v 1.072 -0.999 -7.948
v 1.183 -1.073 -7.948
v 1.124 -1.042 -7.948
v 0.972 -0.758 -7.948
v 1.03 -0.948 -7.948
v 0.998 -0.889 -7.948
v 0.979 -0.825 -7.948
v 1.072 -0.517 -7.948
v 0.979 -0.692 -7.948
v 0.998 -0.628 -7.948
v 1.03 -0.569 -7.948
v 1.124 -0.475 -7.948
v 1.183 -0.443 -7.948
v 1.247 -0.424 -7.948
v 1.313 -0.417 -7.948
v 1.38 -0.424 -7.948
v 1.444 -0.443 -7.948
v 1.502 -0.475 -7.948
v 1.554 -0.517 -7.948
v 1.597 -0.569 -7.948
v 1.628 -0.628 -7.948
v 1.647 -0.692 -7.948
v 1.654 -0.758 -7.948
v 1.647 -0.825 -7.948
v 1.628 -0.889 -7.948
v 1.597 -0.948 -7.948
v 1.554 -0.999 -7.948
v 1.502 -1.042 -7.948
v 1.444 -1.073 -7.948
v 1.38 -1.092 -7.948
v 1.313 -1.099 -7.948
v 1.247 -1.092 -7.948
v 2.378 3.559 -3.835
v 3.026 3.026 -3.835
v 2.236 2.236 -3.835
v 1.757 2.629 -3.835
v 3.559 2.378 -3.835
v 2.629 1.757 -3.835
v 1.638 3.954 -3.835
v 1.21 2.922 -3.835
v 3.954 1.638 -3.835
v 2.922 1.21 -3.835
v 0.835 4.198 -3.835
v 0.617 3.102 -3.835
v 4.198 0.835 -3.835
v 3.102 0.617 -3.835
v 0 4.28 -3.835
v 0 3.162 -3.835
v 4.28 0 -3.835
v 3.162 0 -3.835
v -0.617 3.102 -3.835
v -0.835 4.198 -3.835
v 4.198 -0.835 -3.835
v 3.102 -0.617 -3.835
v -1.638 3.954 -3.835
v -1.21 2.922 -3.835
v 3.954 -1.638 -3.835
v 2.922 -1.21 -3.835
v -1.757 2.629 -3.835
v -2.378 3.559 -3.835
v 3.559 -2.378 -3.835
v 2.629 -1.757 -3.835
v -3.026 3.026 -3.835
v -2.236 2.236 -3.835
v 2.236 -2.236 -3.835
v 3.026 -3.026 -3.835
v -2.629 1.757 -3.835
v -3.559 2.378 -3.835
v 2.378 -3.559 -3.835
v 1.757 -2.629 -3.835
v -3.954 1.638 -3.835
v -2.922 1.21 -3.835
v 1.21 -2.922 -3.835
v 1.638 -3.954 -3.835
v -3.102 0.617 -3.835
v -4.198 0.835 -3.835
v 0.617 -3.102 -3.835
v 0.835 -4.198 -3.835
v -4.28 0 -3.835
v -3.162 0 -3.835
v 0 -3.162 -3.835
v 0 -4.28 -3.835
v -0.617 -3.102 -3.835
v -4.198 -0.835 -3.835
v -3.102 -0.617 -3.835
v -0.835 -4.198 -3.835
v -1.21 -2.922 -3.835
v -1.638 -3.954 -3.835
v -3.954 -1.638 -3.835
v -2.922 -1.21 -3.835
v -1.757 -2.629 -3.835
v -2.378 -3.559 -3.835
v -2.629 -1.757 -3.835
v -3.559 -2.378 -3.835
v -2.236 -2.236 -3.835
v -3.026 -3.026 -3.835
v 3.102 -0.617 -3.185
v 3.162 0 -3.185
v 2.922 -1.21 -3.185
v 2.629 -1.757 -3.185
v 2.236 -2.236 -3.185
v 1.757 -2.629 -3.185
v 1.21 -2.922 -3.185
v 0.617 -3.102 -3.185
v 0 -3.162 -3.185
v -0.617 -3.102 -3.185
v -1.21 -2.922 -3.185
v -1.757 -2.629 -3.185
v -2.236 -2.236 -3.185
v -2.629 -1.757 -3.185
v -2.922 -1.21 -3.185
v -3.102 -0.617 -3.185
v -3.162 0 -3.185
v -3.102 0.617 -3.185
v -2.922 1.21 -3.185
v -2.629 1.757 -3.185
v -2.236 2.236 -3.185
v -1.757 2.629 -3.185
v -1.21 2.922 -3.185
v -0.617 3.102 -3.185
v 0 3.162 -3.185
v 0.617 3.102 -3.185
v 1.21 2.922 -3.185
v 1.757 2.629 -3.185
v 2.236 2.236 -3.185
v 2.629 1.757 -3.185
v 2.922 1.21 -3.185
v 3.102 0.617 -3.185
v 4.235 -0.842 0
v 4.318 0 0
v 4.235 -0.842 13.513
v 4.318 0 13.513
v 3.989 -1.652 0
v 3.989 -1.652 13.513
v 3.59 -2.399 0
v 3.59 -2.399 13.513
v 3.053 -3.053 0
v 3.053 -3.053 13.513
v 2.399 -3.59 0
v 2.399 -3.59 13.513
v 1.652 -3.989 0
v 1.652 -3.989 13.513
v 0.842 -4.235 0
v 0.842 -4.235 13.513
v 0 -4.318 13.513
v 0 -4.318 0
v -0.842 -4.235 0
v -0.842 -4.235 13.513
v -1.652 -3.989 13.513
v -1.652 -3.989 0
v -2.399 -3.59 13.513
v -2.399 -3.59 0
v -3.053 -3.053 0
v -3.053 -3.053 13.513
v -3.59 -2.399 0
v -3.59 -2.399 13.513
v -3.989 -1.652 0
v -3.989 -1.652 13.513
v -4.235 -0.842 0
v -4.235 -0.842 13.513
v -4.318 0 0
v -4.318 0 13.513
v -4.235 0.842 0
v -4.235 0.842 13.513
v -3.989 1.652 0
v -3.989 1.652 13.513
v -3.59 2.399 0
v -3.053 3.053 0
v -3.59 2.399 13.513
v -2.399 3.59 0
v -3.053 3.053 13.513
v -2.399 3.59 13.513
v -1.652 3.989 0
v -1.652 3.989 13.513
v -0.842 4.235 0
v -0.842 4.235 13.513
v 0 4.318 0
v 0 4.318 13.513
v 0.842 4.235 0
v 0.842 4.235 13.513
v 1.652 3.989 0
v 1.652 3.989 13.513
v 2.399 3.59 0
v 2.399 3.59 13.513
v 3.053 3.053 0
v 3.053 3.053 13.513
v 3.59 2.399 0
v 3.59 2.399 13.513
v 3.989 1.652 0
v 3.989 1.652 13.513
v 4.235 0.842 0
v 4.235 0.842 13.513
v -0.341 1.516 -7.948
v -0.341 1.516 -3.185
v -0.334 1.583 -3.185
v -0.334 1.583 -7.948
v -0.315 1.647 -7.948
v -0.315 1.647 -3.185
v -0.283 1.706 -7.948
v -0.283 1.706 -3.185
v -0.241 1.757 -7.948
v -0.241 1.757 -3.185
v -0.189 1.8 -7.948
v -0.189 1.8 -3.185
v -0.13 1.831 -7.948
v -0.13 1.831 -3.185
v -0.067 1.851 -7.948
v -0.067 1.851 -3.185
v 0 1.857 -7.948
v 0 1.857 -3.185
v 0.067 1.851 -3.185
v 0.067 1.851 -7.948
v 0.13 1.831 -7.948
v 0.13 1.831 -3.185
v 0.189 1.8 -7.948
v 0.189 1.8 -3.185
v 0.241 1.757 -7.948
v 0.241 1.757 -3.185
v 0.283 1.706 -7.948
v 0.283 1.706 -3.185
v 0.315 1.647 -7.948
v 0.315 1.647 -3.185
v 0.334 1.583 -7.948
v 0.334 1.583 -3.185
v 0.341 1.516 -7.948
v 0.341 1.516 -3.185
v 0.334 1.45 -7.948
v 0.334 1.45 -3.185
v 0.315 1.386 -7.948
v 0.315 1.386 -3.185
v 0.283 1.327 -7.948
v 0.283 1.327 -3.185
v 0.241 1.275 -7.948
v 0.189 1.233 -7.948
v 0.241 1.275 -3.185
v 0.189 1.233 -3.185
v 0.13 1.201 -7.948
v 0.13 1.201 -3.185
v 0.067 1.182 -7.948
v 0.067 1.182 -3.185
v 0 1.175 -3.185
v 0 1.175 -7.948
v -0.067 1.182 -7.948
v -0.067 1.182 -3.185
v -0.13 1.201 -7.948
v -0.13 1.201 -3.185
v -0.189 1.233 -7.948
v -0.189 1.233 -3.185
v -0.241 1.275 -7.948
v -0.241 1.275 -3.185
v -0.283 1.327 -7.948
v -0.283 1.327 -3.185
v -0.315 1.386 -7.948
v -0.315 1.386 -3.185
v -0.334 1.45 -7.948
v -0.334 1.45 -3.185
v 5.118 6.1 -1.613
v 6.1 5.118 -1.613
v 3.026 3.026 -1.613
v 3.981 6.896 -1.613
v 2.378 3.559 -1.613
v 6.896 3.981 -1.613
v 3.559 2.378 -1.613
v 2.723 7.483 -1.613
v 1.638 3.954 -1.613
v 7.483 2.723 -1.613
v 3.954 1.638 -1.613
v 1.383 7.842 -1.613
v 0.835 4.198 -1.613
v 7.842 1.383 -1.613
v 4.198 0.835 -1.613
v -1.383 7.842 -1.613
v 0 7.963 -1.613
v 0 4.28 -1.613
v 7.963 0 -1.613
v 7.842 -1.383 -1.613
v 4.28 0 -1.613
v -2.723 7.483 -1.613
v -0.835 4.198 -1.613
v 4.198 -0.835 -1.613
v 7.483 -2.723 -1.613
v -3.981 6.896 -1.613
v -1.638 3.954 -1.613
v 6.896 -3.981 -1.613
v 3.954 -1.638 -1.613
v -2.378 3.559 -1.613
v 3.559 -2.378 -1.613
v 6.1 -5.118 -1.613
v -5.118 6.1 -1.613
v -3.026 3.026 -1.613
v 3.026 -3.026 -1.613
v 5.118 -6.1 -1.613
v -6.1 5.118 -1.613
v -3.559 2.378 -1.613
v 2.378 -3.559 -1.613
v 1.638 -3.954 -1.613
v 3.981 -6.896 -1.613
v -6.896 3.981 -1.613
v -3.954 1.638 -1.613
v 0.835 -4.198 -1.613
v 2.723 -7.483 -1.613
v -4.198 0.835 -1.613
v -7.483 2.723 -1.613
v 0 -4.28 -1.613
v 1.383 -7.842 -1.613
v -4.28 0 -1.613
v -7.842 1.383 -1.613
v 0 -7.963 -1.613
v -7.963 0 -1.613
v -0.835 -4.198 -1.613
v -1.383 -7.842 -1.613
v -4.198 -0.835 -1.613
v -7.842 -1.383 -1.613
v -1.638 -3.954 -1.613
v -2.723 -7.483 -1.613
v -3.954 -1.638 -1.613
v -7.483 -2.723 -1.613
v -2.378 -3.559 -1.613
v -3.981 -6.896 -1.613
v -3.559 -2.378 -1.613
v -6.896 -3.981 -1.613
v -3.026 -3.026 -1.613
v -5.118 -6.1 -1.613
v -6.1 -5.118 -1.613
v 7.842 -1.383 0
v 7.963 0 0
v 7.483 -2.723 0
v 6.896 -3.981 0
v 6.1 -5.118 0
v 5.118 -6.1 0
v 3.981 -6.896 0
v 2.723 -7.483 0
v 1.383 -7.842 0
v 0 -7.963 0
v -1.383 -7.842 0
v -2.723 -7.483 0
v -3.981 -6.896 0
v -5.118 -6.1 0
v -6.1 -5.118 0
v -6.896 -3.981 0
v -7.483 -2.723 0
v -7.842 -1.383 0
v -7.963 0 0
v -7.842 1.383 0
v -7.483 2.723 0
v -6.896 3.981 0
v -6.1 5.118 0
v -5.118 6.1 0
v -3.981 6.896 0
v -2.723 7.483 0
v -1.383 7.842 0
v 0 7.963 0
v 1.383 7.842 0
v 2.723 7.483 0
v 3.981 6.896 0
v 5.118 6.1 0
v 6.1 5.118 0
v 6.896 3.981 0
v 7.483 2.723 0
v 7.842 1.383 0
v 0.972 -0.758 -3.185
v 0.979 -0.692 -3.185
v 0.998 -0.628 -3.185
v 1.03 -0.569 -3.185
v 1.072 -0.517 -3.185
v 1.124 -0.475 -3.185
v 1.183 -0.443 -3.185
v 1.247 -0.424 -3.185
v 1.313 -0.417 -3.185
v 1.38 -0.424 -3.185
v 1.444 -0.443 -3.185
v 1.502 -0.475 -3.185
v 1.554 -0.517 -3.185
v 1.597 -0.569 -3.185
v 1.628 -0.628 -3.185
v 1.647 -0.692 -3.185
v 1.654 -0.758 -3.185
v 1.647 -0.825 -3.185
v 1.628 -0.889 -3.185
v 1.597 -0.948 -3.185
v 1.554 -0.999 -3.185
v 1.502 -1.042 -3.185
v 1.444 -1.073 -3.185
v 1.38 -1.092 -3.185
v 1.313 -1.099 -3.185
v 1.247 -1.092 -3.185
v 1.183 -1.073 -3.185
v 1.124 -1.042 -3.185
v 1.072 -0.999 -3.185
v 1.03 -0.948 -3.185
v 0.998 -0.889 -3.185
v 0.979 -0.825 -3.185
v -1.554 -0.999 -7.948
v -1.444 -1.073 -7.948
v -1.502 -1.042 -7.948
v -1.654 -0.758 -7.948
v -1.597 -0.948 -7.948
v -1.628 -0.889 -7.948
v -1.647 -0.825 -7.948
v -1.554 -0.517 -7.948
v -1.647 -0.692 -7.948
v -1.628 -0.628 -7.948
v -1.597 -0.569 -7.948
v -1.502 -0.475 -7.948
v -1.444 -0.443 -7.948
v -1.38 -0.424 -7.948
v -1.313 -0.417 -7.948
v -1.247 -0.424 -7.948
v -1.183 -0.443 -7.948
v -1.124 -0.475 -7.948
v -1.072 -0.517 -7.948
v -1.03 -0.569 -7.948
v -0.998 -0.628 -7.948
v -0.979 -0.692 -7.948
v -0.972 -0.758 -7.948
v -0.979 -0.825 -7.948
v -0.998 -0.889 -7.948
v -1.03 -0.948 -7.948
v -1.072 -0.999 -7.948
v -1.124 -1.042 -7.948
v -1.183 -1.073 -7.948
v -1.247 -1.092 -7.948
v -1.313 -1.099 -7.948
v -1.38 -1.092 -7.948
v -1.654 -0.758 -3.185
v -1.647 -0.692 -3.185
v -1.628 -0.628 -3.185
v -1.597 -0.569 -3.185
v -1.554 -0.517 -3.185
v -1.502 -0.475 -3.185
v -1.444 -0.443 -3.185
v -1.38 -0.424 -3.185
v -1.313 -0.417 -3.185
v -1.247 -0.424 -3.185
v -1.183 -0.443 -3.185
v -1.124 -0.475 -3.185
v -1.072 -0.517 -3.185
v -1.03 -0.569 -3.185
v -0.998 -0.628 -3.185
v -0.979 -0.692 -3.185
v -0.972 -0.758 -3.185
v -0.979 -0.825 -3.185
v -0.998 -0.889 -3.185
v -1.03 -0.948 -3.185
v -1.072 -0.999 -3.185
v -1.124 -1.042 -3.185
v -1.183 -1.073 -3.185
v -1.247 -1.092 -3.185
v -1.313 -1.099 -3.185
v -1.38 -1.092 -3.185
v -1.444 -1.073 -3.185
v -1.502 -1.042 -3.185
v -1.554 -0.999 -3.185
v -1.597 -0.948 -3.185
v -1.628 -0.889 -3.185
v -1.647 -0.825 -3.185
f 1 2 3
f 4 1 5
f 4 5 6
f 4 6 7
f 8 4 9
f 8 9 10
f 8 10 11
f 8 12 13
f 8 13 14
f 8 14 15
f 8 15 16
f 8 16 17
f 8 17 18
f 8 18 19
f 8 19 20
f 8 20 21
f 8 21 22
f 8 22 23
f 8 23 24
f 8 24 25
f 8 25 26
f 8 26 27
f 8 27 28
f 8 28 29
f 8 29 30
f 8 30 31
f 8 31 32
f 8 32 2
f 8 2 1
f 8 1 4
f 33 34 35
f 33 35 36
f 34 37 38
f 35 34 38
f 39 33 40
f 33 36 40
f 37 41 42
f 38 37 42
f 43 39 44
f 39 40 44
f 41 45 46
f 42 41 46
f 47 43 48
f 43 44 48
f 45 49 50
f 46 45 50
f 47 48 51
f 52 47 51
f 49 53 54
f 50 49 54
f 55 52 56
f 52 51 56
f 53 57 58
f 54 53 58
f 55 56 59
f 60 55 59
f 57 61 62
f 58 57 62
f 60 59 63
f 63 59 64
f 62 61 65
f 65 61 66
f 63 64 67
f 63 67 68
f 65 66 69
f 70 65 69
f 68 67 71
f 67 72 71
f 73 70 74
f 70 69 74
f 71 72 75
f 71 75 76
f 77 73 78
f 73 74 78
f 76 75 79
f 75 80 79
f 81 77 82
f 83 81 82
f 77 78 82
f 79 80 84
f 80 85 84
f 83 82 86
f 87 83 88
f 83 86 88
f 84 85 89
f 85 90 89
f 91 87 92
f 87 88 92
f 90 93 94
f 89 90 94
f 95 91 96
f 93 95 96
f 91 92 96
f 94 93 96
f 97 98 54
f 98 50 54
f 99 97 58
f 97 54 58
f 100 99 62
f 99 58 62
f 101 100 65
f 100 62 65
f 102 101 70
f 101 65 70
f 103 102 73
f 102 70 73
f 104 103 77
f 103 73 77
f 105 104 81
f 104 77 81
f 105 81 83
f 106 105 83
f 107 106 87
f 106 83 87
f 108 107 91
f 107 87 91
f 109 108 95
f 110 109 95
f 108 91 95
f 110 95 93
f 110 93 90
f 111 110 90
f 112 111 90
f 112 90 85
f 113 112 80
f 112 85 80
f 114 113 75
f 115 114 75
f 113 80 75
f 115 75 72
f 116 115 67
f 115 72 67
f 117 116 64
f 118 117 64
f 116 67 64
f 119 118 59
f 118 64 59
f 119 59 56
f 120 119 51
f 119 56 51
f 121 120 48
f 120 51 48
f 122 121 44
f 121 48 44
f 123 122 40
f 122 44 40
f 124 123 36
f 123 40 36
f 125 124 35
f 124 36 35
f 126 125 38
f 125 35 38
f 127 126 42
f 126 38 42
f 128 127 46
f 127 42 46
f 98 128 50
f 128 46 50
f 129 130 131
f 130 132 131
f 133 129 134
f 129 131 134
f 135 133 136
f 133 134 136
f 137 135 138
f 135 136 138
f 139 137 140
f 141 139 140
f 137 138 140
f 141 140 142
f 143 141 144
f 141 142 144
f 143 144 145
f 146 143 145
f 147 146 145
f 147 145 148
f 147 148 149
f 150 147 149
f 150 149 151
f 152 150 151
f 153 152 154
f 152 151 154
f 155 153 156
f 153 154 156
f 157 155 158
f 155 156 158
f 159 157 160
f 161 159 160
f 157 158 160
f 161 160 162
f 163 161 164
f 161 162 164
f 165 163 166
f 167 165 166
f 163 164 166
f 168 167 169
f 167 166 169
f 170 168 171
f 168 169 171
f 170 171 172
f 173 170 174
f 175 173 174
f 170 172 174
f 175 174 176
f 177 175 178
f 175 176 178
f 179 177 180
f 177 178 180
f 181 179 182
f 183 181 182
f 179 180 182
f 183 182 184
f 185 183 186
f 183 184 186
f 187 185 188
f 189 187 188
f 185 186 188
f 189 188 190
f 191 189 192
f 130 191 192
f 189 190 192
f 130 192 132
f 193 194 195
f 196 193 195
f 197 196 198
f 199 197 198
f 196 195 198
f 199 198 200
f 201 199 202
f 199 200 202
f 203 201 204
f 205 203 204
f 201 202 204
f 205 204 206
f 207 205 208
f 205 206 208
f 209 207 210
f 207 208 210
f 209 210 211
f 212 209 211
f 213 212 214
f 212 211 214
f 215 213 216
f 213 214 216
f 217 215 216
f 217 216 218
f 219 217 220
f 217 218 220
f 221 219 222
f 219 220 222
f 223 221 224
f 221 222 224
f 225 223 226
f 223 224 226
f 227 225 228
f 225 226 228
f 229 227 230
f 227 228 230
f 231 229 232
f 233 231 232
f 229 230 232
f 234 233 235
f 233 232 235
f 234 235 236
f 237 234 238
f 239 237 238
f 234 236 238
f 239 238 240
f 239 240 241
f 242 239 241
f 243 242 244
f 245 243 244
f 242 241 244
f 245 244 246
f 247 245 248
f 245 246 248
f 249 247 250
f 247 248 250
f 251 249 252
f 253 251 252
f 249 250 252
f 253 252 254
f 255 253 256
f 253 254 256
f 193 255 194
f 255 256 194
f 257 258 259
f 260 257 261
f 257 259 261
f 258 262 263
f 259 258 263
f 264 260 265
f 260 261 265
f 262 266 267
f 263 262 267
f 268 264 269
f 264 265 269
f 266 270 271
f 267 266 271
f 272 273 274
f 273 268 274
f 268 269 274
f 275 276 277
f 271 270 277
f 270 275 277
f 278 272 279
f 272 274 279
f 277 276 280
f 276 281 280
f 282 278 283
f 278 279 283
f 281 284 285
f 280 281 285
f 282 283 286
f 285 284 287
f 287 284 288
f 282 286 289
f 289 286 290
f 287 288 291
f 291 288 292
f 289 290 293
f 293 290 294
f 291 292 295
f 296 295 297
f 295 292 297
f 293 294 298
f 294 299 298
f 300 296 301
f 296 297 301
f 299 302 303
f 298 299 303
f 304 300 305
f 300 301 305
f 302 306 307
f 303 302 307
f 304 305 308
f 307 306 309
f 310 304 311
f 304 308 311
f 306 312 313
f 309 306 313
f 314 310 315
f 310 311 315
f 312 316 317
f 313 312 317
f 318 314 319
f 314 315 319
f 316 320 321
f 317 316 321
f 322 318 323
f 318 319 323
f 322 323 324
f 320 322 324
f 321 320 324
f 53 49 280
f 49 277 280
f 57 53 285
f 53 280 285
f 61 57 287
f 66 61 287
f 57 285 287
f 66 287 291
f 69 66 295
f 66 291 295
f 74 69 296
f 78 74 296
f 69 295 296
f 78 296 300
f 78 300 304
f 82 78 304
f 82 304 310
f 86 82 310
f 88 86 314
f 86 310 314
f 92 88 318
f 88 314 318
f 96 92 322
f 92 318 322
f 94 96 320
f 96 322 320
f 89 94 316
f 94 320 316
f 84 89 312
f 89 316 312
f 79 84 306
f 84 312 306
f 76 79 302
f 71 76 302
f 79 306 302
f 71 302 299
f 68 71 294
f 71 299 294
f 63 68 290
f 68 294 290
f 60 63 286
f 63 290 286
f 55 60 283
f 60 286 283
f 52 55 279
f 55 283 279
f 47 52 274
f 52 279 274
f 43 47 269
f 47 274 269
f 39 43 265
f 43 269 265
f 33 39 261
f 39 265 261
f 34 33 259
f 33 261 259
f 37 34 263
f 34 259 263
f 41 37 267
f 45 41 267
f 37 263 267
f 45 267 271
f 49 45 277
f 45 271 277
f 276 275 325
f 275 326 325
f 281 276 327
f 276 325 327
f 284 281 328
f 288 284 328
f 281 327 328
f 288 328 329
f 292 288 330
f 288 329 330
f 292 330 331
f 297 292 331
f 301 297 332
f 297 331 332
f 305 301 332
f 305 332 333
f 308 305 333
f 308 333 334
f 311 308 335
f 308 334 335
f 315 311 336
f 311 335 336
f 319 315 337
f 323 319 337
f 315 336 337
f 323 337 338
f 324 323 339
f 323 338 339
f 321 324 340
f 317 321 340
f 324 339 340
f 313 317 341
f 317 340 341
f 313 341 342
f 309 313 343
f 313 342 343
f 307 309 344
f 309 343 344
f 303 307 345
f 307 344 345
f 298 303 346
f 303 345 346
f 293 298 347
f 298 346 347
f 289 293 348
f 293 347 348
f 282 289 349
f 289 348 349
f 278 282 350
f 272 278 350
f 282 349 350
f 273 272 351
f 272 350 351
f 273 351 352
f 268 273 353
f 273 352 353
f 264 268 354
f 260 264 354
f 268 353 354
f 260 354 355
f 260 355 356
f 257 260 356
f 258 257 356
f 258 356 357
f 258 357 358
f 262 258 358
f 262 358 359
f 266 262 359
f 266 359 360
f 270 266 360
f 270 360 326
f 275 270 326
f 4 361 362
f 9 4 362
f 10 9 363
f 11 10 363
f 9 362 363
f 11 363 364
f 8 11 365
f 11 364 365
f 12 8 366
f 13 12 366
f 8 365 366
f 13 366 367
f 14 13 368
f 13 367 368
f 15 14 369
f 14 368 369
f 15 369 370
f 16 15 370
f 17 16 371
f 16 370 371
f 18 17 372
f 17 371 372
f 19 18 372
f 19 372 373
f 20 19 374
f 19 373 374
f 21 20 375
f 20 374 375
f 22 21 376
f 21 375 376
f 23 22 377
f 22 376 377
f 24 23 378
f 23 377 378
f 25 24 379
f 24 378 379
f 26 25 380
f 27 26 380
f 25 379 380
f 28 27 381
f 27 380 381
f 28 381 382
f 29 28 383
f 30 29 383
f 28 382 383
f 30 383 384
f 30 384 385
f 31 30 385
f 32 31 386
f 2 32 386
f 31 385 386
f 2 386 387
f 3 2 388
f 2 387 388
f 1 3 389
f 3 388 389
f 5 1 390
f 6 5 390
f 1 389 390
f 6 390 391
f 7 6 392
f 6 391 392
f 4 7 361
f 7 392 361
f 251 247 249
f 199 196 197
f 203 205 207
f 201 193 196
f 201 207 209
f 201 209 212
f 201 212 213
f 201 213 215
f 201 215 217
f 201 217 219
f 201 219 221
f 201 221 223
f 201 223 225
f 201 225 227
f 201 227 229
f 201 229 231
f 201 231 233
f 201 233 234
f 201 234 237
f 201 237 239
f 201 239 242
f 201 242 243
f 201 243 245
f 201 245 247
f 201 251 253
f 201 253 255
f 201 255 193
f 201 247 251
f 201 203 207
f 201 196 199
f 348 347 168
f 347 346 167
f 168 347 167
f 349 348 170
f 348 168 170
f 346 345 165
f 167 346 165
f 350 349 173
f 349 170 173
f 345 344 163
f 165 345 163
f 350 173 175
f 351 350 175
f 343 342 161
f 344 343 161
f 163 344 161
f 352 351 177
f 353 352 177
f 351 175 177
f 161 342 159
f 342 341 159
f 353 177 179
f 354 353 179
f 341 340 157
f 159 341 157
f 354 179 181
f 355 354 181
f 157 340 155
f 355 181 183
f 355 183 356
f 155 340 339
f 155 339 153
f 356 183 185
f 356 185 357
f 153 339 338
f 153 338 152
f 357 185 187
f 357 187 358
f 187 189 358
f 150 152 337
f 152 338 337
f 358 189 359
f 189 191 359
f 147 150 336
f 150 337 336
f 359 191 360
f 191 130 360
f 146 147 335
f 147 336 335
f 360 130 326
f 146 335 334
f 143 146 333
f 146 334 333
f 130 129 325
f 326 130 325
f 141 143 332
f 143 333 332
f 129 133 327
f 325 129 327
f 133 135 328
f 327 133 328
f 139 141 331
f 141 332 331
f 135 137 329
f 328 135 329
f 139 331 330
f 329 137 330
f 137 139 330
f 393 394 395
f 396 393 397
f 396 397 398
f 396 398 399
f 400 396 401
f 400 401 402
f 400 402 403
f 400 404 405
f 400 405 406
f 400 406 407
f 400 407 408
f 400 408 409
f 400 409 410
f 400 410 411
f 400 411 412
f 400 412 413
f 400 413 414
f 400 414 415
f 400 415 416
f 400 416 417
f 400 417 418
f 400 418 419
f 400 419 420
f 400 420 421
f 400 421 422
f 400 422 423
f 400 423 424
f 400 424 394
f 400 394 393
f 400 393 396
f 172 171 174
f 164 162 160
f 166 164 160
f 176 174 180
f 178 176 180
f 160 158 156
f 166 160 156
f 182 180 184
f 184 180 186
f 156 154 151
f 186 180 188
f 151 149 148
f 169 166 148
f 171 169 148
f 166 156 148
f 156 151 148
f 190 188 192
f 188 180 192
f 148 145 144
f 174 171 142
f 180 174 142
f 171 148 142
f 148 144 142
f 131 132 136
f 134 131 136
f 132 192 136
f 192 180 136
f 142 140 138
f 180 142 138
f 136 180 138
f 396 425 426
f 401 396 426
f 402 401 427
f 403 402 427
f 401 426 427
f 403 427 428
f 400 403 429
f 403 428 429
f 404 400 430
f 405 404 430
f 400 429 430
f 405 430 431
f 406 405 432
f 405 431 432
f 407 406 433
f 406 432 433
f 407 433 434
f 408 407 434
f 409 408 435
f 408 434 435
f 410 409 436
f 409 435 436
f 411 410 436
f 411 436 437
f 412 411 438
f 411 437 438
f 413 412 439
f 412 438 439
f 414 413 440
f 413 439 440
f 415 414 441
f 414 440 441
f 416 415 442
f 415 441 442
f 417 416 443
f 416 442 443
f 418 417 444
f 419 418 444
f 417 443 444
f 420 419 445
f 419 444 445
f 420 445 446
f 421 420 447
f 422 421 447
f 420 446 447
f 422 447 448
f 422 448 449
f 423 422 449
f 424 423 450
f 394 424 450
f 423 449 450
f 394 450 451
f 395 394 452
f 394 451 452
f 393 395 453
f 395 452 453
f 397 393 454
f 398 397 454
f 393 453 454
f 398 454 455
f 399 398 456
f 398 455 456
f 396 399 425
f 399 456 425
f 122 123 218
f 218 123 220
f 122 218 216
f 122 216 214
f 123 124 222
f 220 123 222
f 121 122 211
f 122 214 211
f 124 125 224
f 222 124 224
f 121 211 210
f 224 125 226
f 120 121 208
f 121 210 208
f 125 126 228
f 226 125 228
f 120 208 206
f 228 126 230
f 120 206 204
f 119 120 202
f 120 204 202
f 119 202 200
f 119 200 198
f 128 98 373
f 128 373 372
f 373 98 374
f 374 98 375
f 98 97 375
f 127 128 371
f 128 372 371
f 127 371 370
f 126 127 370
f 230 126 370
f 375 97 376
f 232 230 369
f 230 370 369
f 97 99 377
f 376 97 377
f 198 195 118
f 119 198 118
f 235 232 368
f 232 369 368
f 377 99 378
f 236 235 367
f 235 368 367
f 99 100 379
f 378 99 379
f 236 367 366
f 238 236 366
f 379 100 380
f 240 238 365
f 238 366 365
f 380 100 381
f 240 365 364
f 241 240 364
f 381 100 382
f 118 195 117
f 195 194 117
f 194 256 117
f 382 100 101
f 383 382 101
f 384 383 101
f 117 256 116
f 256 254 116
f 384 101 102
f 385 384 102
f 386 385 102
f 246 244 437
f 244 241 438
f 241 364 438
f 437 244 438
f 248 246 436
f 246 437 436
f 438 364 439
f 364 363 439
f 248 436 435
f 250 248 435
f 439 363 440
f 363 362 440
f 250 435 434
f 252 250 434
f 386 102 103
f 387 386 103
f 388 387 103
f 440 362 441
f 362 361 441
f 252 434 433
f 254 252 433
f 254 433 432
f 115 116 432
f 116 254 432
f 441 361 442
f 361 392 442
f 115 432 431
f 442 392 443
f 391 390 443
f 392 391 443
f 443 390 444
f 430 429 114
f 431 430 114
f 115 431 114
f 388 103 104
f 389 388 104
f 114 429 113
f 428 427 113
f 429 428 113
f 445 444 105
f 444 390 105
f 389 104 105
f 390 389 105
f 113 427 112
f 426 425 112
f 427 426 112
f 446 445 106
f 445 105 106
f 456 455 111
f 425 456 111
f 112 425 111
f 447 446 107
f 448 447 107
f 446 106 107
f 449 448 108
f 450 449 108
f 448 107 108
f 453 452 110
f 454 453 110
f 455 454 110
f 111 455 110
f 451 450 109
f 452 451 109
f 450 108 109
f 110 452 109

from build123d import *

# Parameters (mm, degrees)
SKETCH4_R           = 0.340929453
BOSS_EXTRUDE1_DEPTH = 4.7625


with BuildPart() as part:
    # Sketch3 → Revolve1 (revolve)
    with BuildSketch(Plane(origin=(0, 0, 0), x_dir=(1, 0, 0), z_dir=(0, 1, 0))):
        Polygon((0, 0), (0, 3.18516), (3.1623, 3.18516), (3.1623, 3.8354), (4.2799, 3.8354), (4.2799, 1.6129), (7.9629, 1.6129), (7.9629, 0), (4.318, 0), (4.318, -13.5128), (0, -13.5128), align=None)
    revolve(axis=Axis((0, 0, 13.5128), (0, 0, -1)))

    # Sketch4 → Boss-Extrude1 (add)
    with BuildSketch(Plane(origin=(0, 0, -3.18516), x_dir=(-1, 0, 0), z_dir=(0, 0, -1))):
        with Locations((0, 1.516184255)):
            Circle(SKETCH4_R)
        with Locations((1.313054082, -0.758092128)):
            Circle(SKETCH4_R)
        with Locations((-1.313054082, -0.758092128)):
            Circle(SKETCH4_R)
    extrude(amount=BOSS_EXTRUDE1_DEPTH)


solid = part.part
